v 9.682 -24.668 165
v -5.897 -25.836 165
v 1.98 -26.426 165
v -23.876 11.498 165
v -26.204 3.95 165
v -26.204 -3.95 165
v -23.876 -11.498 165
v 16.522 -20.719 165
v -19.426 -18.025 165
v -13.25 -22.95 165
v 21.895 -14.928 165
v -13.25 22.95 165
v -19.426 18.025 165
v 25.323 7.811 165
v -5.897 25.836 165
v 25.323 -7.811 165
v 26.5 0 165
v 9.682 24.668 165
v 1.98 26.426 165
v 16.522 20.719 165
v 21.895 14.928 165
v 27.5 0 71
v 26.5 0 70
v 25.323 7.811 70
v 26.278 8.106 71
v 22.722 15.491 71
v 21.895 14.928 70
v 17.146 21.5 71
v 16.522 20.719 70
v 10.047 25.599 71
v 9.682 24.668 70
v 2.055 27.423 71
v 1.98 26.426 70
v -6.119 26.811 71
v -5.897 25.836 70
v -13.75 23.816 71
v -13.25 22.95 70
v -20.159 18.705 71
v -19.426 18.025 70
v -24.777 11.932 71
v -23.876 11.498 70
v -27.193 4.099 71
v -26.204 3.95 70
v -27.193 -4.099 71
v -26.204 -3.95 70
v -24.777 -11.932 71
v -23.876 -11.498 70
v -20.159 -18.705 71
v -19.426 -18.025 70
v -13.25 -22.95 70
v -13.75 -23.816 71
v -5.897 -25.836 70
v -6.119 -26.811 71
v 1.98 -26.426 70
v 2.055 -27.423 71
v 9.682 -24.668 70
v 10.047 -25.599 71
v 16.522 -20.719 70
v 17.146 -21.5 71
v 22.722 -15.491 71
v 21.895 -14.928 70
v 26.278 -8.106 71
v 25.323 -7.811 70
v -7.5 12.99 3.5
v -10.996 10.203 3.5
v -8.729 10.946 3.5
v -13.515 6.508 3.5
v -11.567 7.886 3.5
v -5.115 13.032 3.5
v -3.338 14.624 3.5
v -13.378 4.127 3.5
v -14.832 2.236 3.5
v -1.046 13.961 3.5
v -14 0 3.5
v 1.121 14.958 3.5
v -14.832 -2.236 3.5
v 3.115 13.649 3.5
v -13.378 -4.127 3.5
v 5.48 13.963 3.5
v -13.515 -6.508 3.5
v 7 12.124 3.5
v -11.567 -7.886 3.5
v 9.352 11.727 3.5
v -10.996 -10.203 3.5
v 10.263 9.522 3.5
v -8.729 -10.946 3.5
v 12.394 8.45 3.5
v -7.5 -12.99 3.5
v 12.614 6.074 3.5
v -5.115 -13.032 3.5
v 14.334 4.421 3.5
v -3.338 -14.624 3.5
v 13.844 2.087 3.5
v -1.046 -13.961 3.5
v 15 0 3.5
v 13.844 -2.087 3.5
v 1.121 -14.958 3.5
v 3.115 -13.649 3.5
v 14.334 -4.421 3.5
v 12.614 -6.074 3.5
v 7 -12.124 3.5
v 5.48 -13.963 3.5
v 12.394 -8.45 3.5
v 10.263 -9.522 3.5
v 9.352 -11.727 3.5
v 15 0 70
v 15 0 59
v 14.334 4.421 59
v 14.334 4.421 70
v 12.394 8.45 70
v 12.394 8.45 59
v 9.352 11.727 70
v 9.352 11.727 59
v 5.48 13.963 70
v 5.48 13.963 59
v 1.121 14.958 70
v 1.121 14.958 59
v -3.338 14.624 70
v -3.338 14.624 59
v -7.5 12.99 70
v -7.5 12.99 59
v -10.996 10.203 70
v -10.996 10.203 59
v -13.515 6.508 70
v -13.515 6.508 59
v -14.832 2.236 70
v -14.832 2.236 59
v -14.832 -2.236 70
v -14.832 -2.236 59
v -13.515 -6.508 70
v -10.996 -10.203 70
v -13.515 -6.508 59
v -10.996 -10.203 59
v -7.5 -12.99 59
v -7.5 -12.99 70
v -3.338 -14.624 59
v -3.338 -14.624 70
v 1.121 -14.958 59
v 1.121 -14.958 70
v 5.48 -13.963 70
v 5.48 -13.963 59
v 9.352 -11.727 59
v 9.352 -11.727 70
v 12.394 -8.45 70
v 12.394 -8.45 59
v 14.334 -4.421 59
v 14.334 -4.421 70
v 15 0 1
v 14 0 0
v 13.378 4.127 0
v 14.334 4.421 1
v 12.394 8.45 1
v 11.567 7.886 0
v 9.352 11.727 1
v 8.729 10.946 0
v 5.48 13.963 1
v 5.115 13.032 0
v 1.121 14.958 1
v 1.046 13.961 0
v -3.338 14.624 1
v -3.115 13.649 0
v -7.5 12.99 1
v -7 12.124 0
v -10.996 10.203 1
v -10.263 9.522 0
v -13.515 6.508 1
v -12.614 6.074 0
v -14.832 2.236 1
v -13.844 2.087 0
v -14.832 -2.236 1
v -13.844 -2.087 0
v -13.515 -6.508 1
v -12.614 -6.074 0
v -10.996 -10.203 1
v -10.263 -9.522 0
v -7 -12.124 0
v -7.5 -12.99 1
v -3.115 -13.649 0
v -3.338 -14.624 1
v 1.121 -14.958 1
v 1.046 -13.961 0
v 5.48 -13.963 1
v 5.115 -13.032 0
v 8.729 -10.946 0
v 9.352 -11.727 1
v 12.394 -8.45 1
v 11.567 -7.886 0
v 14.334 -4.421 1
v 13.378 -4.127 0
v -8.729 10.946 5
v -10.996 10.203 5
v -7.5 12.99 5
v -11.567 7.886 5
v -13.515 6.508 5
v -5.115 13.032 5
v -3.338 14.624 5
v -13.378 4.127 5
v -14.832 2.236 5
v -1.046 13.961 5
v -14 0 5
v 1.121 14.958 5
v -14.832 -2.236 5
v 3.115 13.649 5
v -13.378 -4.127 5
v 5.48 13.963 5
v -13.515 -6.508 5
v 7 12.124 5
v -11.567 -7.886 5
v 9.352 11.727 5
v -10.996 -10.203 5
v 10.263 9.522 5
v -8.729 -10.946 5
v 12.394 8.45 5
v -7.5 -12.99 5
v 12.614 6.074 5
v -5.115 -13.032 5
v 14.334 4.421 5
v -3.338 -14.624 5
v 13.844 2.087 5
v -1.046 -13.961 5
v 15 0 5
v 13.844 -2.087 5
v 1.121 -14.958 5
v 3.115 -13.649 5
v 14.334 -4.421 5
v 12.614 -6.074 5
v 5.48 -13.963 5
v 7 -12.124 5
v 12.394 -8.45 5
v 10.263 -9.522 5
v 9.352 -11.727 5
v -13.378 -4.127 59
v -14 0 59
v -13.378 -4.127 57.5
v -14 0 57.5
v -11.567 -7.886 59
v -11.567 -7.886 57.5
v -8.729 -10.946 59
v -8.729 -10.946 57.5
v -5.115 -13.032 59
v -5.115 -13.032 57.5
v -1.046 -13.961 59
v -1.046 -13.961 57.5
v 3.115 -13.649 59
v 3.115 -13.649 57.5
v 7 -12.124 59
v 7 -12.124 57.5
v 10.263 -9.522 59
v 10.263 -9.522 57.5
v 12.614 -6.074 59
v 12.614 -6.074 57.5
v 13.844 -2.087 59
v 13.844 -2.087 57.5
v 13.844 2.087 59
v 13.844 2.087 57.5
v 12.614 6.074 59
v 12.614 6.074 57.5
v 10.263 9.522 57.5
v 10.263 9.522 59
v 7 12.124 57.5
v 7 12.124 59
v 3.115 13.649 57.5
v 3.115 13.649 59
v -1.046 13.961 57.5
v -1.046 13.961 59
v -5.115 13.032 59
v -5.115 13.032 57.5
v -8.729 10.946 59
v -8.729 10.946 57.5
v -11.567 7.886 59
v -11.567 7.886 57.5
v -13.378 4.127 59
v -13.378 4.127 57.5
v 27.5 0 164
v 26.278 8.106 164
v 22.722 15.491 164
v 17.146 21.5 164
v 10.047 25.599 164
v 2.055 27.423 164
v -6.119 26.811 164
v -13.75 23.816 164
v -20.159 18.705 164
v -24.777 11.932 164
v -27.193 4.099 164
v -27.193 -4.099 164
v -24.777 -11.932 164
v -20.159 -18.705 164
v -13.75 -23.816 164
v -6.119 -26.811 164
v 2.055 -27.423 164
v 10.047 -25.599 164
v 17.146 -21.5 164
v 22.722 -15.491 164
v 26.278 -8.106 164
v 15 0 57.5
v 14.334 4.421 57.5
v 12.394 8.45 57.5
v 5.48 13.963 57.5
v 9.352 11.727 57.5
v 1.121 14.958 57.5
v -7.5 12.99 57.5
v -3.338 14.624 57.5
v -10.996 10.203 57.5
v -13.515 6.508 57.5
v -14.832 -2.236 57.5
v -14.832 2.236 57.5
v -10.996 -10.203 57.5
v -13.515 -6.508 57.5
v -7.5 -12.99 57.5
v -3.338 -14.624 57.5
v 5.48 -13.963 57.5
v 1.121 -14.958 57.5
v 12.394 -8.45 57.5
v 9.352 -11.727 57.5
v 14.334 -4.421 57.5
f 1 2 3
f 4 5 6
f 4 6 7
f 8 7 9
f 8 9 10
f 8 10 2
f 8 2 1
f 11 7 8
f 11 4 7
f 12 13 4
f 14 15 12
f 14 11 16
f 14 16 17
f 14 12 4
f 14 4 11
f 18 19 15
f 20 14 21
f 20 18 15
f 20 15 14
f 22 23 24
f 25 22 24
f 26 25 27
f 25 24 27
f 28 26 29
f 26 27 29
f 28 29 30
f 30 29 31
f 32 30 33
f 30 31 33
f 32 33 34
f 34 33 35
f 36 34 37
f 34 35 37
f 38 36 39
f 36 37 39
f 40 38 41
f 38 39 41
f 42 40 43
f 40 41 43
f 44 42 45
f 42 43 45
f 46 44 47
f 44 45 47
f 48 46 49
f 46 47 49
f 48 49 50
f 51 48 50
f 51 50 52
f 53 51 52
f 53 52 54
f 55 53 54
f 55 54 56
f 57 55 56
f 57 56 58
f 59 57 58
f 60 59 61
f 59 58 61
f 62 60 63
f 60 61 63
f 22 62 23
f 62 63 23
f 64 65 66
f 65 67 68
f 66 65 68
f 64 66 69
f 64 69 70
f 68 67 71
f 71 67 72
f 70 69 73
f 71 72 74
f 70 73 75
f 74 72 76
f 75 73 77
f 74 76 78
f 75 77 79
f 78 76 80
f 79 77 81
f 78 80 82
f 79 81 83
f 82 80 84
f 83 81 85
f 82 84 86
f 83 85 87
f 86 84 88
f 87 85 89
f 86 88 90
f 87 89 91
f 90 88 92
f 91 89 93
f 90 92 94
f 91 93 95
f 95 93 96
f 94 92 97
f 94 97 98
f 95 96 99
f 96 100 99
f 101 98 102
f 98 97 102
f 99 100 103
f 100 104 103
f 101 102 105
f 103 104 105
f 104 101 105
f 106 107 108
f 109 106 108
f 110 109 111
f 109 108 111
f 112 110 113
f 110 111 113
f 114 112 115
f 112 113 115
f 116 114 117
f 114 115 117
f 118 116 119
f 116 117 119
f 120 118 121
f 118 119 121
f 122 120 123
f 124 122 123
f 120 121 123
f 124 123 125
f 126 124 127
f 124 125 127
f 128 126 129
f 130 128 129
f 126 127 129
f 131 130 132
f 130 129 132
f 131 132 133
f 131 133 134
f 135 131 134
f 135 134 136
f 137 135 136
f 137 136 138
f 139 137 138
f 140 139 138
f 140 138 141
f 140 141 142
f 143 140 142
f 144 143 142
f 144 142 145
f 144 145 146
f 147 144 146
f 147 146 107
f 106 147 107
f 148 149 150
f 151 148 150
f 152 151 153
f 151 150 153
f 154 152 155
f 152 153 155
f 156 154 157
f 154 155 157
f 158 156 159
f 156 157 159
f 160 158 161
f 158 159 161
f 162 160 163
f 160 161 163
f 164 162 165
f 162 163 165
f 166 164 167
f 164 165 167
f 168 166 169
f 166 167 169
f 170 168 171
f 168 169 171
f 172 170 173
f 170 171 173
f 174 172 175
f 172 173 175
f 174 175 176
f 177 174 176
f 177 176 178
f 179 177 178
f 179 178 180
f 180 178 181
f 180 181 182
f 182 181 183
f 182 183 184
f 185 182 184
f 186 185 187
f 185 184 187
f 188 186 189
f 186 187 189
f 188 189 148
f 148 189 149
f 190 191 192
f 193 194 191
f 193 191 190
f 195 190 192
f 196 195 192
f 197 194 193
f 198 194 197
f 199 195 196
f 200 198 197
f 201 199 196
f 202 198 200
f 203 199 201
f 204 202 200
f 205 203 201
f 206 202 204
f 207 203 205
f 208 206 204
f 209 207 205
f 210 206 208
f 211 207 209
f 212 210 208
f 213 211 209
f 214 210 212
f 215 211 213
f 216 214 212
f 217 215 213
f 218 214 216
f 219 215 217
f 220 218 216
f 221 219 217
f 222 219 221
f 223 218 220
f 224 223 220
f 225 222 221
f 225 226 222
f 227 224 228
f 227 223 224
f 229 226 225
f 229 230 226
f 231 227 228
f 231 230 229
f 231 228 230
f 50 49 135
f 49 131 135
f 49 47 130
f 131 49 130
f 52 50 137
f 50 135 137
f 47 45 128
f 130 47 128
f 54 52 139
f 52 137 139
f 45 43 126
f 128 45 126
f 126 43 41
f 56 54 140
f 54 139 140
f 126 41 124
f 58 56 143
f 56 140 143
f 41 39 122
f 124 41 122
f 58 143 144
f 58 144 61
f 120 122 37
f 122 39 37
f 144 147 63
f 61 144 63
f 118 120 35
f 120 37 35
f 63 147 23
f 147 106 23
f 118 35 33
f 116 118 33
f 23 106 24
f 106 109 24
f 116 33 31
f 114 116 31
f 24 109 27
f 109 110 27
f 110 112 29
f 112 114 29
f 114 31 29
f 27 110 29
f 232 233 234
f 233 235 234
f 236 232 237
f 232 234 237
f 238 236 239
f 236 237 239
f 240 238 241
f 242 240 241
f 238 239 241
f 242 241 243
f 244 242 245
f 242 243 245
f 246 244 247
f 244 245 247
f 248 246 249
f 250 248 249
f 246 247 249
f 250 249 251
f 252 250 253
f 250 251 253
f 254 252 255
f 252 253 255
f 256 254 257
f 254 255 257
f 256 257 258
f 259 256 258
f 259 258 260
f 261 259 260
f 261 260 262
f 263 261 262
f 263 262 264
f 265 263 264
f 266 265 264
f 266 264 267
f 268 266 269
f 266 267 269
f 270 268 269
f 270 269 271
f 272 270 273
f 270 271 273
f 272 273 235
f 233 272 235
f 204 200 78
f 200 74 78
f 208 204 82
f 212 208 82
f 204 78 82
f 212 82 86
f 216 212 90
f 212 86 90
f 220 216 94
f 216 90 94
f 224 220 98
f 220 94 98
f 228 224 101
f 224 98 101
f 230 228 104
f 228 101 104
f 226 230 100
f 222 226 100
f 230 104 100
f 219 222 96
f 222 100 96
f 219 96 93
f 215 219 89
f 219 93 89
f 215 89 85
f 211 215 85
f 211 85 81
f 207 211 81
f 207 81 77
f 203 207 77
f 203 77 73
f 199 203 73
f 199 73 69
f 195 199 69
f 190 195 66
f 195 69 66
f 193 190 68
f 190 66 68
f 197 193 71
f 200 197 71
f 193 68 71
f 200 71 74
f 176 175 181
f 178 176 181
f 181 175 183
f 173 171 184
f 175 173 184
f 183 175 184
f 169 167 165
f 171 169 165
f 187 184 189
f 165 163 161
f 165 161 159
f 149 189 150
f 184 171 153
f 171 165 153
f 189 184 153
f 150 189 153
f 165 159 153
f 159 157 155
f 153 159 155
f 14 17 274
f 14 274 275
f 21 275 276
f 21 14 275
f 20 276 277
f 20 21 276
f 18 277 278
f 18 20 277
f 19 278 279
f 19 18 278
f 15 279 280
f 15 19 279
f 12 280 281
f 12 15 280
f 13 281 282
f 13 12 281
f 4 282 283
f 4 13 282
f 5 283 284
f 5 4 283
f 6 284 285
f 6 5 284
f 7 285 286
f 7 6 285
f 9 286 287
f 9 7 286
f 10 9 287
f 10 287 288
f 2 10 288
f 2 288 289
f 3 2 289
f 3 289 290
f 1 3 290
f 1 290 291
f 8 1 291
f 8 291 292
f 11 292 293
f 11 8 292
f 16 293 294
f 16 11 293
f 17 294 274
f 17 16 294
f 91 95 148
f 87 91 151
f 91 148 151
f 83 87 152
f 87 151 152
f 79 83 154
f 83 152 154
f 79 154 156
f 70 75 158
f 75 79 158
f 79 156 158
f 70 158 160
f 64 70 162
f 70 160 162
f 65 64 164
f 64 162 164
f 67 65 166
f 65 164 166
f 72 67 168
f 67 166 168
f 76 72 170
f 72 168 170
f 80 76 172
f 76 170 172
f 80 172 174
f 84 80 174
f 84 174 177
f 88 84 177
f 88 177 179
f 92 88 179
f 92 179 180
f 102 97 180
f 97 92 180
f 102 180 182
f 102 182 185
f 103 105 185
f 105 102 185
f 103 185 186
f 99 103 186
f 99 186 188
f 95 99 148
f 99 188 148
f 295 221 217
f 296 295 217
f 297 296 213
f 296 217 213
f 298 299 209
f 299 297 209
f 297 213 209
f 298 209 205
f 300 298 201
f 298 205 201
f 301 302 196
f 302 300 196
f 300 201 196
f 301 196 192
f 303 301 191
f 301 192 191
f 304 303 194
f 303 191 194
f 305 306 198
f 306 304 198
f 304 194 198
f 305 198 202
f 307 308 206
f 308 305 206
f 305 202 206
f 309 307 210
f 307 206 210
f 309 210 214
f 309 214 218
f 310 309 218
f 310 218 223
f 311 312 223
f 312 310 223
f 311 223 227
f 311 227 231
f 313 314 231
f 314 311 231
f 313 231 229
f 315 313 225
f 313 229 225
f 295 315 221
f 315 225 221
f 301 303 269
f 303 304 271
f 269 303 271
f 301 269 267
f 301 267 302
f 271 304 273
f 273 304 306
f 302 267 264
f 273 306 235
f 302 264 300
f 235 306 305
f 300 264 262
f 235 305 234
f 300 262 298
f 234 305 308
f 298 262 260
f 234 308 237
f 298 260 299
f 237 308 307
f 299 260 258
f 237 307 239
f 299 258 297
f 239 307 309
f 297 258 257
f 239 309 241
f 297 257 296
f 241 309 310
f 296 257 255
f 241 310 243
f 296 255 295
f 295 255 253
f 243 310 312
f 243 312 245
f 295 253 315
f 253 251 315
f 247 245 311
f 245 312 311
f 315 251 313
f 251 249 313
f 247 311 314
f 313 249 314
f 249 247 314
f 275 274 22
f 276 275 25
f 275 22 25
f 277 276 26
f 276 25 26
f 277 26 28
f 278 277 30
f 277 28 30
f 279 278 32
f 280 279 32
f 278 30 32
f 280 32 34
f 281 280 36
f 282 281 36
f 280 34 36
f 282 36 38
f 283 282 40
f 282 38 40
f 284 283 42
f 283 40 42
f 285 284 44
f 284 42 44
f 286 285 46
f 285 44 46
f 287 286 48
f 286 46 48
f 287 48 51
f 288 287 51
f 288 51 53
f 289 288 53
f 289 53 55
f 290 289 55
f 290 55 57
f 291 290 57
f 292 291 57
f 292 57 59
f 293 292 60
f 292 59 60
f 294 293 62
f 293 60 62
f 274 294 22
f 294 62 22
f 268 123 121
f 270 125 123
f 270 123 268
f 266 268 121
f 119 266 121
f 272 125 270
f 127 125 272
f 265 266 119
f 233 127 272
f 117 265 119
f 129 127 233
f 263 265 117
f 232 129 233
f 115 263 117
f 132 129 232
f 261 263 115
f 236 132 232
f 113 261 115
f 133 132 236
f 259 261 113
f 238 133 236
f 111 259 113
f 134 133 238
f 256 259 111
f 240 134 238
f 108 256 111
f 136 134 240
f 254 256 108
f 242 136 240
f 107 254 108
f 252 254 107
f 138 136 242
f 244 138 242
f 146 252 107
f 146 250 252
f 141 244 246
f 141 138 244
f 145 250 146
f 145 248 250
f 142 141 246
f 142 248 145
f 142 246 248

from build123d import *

# Parameters (mm, degrees)
SKETCH_1_R      = 15
EXTRUDE_1_DEPTH = 70
SKETCH_2_R      = 27.5
EXTRUDE_2_DEPTH = 95
CHAMFER_1_SIZE  = 1
SKETCH_3_W      = 5.21377611
SKETCH_3_H      = 1.5


with BuildPart() as part:
    # 草图1 → 凸台-拉伸1 (new body)
    with BuildSketch(Plane.XY):
        Circle(SKETCH_1_R)
    extrude(amount=EXTRUDE_1_DEPTH)

    # 草图2 → 凸台-拉伸2 (add)
    with BuildSketch(Plane.XY.offset(70)):
        Circle(SKETCH_2_R)
    extrude(amount=EXTRUDE_2_DEPTH)

    # 倒角1
    chamfer_1_edges = [part.edges().sort_by_distance(p)[0] for p in [
        (-15, 0, 0),
        (-27.5, 0, 70),
        (-27.5, 0, 165),
    ]]
    chamfer(chamfer_1_edges, length=CHAMFER_1_SIZE)

    # 草图3 → 切除-旋转1 (revolve, cut)
    with BuildSketch(Plane(origin=(0, 0, 0), x_dir=(1, 0, 0), z_dir=(0, 1, 0)), mode=Mode.PRIVATE) as cut_revolve_1_sk:
        with Locations((16.606888055, -58.25)):
            Rectangle(SKETCH_3_W, SKETCH_3_H)
        with Locations((16.606888055, -4.25)):
            Rectangle(SKETCH_3_W, SKETCH_3_H)
    revolve(cut_revolve_1_sk.sketch.rotate(Axis((0, 0, -18.215048165), (0, 0, 1)), 180), axis=Axis((0, 0, -18.215048165), (0, 0, 1)), mode=Mode.SUBTRACT)


solid = part.part
